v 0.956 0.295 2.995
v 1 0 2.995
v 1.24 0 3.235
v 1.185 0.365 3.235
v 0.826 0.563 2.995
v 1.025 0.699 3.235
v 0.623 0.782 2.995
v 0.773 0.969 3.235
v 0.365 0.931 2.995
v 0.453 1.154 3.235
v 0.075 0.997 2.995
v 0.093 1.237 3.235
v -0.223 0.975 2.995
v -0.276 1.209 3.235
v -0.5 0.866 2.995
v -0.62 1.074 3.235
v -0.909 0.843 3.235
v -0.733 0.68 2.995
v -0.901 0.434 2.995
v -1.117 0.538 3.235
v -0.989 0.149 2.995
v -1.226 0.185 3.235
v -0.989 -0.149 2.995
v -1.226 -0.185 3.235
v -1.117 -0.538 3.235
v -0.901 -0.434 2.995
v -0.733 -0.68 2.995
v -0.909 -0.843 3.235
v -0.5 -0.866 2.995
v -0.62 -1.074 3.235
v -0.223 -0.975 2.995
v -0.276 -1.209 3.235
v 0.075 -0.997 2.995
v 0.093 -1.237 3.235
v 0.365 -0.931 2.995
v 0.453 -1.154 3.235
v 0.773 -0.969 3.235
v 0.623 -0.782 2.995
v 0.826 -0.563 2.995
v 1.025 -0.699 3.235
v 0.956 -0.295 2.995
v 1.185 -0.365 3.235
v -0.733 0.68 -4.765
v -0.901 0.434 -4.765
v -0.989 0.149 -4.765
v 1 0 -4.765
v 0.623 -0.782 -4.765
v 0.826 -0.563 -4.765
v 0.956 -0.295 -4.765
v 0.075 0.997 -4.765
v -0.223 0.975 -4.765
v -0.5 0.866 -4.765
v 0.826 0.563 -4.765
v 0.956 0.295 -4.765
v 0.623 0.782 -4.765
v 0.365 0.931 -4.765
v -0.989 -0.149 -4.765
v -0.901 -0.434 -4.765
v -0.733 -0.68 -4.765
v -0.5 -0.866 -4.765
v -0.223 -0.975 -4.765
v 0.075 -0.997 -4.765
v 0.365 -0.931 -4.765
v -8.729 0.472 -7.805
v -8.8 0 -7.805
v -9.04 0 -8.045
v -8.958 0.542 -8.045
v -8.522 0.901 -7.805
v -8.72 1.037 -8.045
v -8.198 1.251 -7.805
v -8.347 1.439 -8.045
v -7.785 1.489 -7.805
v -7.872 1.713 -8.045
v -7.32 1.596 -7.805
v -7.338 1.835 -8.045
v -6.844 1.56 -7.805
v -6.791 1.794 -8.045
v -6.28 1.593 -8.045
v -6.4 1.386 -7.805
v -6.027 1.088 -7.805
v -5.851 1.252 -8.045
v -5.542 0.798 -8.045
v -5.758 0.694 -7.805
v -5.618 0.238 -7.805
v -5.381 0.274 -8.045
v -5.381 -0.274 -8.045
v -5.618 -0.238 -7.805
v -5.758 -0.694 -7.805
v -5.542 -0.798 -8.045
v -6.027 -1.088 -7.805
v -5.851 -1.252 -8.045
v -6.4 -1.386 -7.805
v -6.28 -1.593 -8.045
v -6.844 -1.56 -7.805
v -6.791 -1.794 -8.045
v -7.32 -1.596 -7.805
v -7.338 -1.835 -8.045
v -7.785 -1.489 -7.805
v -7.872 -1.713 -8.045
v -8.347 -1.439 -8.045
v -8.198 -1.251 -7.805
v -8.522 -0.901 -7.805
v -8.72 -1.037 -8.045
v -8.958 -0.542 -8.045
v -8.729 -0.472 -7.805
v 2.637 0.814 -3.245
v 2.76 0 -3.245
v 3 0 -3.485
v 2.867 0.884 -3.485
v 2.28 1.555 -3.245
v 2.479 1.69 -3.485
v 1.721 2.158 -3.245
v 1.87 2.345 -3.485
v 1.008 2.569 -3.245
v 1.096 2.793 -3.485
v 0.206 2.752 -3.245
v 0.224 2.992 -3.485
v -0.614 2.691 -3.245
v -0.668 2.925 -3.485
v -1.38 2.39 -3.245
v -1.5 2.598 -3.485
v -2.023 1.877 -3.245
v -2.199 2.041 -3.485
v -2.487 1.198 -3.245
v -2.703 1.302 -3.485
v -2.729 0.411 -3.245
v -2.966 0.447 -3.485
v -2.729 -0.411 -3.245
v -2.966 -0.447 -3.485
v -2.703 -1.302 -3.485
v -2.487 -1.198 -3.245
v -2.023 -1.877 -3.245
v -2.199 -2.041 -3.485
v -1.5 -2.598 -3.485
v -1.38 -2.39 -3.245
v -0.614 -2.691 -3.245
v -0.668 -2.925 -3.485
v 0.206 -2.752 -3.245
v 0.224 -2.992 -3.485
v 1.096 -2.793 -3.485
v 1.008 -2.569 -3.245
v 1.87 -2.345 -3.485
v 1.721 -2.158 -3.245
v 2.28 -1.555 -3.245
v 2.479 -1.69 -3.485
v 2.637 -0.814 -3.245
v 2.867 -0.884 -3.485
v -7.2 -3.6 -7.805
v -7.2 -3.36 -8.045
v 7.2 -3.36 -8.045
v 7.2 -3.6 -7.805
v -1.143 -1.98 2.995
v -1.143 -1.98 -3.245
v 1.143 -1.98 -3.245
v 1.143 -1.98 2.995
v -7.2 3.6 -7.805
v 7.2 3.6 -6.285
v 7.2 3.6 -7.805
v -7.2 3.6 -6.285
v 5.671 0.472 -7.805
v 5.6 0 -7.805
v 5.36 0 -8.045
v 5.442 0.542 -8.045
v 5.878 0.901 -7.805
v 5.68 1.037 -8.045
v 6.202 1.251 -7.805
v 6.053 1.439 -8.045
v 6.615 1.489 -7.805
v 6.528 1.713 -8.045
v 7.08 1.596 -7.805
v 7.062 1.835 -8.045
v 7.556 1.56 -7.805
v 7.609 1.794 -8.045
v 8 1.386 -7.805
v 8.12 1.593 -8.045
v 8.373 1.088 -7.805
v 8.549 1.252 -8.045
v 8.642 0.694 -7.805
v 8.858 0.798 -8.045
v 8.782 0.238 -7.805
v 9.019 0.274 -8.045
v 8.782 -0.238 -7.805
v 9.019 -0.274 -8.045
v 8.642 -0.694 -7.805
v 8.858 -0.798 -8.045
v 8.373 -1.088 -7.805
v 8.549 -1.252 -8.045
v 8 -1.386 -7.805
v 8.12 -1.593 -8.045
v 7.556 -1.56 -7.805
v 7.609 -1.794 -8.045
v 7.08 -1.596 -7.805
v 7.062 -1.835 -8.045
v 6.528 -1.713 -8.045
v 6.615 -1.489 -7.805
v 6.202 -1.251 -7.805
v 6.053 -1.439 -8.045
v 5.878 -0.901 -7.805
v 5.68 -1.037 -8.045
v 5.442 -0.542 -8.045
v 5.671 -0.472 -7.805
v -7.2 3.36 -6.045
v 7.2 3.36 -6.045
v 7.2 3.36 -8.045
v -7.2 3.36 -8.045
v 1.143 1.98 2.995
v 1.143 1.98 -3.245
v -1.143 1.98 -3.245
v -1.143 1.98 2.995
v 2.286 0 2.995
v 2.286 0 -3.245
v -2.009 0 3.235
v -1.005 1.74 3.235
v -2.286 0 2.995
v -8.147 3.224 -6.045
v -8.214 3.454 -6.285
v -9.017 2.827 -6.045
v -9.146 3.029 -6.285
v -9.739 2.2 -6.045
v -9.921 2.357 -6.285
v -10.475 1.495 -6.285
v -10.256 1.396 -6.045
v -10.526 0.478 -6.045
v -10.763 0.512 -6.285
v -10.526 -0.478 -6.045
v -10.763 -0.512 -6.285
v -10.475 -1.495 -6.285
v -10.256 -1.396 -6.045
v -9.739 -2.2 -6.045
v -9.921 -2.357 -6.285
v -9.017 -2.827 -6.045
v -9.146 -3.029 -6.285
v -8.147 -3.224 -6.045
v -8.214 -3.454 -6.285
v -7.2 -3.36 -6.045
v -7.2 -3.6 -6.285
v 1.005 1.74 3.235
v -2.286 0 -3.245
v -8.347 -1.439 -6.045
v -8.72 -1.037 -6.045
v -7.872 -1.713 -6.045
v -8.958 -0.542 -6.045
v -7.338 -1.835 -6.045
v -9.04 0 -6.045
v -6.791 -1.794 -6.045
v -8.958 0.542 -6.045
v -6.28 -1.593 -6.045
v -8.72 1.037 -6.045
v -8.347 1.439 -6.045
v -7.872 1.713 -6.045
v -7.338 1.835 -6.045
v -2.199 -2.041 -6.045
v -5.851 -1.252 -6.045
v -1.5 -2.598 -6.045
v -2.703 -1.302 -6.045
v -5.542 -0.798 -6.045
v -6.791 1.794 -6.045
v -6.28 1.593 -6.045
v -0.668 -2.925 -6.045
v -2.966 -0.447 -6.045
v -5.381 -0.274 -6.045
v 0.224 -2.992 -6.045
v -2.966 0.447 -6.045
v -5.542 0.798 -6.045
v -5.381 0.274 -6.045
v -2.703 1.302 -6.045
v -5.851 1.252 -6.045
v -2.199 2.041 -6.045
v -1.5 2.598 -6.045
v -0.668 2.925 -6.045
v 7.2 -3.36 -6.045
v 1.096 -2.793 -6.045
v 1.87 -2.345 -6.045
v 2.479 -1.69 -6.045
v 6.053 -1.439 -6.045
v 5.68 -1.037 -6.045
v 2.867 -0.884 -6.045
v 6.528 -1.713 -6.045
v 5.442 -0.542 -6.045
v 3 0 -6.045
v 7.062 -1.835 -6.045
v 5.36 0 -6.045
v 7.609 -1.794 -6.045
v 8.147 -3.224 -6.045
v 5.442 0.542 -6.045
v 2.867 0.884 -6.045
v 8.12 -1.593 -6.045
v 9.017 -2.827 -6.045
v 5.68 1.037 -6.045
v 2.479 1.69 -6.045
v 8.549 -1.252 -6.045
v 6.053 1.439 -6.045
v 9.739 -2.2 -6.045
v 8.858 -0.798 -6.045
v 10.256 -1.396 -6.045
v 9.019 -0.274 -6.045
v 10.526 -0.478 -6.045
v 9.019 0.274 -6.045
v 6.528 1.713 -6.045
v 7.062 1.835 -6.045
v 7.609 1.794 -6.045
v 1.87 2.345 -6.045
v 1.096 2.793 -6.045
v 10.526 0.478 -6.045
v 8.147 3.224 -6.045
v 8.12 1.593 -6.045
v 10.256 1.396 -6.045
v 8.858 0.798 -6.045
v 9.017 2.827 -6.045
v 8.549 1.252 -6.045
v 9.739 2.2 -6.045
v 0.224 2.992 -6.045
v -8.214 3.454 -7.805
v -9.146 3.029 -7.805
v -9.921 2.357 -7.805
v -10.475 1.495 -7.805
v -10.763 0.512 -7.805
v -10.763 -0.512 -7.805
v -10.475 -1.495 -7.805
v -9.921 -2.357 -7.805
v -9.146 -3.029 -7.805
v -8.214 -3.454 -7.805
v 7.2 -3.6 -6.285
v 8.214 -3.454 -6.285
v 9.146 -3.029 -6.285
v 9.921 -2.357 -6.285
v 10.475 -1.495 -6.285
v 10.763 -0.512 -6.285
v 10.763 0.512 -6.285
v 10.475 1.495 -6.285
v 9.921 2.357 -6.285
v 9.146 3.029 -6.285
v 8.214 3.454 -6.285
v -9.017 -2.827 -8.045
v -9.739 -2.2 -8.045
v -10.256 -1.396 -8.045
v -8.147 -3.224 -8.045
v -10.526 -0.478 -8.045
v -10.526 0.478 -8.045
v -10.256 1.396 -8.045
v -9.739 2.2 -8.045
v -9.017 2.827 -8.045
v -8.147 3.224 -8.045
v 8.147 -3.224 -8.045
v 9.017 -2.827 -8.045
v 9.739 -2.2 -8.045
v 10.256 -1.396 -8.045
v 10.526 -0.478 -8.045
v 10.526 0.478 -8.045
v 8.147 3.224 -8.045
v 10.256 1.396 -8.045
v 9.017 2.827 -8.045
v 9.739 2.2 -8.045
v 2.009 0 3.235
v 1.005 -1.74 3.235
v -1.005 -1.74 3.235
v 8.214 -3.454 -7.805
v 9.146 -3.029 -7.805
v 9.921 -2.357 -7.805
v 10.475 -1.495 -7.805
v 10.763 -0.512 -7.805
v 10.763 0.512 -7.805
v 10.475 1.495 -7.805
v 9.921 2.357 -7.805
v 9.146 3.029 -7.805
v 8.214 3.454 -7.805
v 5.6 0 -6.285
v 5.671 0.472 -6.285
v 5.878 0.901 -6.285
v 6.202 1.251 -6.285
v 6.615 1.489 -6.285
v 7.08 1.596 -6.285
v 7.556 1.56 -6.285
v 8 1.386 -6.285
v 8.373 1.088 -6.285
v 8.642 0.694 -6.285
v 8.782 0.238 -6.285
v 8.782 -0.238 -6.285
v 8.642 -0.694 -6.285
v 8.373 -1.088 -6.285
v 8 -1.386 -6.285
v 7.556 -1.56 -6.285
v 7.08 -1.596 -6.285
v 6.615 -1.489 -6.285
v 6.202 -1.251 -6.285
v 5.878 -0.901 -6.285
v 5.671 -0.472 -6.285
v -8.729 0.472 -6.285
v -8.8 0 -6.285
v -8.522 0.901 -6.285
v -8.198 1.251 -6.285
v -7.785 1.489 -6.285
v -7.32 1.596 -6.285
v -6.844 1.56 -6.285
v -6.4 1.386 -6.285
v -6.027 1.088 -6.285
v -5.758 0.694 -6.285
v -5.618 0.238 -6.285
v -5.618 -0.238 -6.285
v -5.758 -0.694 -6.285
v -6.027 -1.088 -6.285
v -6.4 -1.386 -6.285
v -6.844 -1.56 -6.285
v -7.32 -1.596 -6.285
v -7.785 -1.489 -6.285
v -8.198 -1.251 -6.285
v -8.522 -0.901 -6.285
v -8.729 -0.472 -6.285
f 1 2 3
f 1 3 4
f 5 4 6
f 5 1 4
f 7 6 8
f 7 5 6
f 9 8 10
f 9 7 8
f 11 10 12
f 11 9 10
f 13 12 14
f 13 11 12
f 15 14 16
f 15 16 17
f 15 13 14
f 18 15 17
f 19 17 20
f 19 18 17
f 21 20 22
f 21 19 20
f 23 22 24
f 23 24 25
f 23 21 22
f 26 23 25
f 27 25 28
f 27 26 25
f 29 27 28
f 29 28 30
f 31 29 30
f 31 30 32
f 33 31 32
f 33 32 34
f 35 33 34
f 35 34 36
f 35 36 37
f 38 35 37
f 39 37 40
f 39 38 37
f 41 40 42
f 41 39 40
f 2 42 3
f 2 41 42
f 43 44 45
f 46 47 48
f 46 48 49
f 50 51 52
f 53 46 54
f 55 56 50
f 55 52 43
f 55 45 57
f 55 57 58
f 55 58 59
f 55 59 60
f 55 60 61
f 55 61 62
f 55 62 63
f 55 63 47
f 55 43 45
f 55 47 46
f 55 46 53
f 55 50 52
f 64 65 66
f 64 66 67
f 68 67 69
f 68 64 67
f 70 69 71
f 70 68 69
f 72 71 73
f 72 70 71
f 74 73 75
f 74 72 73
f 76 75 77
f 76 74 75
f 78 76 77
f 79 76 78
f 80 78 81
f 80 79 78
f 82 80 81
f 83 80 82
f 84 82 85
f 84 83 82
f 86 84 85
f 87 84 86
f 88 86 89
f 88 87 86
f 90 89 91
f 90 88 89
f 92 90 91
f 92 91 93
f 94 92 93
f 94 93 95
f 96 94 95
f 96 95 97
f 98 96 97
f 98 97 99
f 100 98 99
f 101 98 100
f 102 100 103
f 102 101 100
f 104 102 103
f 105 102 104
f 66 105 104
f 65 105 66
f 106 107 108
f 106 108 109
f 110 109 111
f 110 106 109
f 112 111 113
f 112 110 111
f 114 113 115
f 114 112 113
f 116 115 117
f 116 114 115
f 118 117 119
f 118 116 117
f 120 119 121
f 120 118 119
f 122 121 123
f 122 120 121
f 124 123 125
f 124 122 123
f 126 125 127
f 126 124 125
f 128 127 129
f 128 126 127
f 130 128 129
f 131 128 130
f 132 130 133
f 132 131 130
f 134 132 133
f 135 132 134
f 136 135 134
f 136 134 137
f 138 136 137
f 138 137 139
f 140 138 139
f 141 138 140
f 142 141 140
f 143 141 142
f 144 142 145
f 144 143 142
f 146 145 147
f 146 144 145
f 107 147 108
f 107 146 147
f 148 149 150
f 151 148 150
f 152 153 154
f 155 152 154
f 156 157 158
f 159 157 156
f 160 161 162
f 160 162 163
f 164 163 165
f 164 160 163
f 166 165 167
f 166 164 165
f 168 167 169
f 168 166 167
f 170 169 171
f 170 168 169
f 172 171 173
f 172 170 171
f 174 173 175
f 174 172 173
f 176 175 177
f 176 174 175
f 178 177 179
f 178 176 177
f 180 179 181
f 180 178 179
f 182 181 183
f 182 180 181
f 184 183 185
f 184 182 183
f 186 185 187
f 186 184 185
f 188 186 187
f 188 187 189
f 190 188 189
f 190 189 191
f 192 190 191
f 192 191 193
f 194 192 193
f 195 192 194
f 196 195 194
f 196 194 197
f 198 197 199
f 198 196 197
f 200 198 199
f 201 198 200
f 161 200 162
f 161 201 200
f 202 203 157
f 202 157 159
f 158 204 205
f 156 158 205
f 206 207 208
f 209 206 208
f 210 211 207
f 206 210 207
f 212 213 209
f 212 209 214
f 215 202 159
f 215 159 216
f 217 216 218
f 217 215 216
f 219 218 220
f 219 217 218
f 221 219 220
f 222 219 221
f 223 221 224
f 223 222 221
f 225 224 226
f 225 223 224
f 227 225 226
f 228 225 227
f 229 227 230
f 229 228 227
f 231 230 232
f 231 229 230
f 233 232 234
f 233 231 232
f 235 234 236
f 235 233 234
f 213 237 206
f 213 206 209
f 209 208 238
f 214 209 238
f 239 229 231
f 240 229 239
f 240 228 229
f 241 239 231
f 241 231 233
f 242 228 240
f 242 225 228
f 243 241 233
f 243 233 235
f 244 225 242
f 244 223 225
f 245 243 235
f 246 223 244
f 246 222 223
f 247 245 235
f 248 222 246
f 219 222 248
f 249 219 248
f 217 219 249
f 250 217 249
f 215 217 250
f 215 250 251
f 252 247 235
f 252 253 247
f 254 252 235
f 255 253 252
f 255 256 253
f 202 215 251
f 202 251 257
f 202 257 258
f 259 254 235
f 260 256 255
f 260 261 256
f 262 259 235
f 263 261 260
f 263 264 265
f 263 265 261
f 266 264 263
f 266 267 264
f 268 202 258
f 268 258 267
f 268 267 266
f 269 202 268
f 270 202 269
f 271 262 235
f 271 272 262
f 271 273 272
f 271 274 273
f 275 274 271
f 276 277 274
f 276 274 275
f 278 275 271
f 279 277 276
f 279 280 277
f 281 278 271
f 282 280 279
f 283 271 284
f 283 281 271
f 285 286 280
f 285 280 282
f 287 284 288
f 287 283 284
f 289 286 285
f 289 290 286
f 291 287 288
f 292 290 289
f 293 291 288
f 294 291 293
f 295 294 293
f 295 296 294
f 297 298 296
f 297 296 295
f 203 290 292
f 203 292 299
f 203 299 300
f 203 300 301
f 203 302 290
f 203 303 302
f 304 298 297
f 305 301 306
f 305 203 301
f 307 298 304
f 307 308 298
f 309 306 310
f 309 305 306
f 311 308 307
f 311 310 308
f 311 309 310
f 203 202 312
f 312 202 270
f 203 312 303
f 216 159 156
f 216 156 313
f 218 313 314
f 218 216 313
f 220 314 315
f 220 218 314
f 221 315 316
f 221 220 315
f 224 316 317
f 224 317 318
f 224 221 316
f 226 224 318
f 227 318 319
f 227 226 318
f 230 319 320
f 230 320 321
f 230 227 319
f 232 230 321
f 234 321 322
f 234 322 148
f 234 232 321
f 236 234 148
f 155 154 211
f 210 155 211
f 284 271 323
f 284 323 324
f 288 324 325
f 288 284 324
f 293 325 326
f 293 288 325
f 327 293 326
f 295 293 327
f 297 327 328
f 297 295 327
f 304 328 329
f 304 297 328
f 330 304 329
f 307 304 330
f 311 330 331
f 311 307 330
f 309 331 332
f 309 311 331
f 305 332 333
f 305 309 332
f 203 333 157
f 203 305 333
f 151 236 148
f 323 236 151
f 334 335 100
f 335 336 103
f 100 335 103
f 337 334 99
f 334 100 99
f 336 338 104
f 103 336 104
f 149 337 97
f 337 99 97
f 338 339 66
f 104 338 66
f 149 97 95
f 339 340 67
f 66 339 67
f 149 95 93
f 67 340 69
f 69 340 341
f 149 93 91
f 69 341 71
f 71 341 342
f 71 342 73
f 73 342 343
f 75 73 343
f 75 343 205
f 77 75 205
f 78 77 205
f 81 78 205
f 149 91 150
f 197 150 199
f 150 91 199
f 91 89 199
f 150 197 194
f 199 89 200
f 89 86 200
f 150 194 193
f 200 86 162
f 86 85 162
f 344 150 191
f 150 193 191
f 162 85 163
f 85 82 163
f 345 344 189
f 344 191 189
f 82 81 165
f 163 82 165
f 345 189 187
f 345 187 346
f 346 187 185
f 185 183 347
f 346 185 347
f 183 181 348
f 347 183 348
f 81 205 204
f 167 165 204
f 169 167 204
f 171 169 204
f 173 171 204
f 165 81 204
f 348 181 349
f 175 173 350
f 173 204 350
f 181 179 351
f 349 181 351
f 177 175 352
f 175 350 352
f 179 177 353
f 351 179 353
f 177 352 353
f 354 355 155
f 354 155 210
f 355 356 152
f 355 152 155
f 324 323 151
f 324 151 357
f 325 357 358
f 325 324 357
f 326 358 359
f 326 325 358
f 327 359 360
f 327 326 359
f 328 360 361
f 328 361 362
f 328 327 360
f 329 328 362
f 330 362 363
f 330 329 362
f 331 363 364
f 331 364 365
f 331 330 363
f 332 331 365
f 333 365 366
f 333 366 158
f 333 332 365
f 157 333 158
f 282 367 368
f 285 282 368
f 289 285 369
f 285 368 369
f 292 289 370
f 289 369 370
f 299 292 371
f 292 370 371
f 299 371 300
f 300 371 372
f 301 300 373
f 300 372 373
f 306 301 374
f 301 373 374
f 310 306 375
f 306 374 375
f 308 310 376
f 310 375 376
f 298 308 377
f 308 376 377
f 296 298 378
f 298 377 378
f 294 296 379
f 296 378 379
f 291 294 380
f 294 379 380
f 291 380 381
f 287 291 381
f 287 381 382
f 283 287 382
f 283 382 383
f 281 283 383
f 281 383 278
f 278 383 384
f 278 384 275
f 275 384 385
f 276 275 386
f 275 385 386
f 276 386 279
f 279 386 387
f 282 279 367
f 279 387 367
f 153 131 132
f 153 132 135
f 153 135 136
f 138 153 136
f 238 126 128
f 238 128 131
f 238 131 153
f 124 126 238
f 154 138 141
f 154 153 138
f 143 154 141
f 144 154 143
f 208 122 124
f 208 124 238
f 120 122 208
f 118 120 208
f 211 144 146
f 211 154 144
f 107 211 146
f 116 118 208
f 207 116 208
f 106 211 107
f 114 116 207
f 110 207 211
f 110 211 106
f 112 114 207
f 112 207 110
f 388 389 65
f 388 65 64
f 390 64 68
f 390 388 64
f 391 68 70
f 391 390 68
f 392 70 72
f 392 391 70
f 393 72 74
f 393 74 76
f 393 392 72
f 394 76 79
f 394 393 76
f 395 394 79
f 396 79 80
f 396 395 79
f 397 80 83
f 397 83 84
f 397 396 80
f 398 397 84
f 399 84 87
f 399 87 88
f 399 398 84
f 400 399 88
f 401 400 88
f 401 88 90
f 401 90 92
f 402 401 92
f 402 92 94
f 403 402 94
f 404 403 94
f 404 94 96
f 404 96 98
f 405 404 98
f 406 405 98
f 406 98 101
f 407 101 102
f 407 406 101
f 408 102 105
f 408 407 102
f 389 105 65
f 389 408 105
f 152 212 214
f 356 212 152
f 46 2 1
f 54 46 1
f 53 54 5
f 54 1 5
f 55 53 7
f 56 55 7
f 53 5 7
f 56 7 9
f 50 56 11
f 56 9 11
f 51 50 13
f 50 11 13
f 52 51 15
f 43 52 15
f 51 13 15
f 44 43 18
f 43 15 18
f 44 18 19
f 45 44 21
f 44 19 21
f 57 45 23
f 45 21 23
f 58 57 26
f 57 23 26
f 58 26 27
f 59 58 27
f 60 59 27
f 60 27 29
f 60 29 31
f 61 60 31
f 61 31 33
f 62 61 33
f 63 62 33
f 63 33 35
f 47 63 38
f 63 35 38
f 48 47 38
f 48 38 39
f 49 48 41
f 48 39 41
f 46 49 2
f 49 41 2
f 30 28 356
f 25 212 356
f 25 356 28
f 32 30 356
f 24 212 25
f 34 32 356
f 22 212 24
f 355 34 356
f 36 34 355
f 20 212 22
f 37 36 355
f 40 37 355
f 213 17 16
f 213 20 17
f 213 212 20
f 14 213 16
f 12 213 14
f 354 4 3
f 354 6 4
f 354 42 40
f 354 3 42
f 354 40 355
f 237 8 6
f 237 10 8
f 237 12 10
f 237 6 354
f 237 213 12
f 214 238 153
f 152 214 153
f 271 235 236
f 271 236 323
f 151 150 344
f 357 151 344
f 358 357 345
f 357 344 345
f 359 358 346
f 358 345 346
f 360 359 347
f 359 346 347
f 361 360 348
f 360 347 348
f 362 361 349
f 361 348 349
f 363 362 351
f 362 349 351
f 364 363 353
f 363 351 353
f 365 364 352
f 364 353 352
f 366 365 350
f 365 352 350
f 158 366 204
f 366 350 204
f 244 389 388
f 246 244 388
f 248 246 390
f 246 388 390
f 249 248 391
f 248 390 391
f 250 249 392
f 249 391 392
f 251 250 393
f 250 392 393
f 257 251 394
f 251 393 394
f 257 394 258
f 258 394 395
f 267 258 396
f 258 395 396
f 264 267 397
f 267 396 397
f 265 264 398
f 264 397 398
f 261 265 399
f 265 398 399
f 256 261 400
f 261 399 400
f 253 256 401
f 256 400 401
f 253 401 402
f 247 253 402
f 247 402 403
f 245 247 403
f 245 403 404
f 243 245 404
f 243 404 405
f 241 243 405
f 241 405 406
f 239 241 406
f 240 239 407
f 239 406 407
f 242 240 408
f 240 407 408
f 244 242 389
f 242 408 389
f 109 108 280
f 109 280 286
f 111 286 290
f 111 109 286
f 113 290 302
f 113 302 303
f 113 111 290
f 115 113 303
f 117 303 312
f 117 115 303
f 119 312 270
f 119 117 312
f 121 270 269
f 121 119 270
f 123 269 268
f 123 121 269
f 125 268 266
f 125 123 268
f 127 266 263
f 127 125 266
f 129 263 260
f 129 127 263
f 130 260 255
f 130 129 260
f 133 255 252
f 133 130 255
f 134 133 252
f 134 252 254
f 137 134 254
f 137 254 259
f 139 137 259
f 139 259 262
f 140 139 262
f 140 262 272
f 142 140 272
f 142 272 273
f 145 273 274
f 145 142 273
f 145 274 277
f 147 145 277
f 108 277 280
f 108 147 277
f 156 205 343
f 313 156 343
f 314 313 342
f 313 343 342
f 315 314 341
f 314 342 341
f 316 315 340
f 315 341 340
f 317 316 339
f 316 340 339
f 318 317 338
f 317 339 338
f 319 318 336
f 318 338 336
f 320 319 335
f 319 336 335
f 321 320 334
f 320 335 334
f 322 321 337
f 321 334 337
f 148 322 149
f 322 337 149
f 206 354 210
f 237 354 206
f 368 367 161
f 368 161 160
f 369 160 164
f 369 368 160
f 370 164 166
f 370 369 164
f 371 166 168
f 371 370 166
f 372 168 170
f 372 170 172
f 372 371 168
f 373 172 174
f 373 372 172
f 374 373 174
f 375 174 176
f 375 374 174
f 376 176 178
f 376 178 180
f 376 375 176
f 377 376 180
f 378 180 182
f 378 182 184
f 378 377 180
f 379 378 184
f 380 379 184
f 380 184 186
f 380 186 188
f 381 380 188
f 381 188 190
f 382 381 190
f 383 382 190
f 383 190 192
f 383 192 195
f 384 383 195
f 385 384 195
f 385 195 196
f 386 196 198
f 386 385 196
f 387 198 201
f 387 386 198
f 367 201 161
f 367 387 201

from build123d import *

# Parameters (mm, degrees)
BOSS_EXTRUDE1_DEPTH = 16.2
SKETCH2_R           = 7.5
BOSS_EXTRUDE2_DEPTH = 7
SKETCH3_R           = 4
BOSS_EXTRUDE3_DEPTH = 5
SKETCH4_R           = 2.5
CUT_EXTRUDE1_DEPTH  = 20
CHAMFER1_SIZE       = 0.6
SCALE1_SCALE        = 0.4


with BuildPart() as part:
    # Sketch1 → Boss-Extrude1 (new body)
    with BuildSketch(Plane.XY):
        Polygon((2.857883832, -4.95), (5.715767665, 0), (2.857883832, 4.95), (-2.857883832, 4.95), (-5.715767665, 0), (-2.857883832, -4.95), align=None)
    extrude(amount=BOSS_EXTRUDE1_DEPTH)

    # Sketch2 → Boss-Extrude2 (add)
    with BuildSketch(Plane.XY):
        Circle(SKETCH2_R)
    extrude(amount=-BOSS_EXTRUDE2_DEPTH)

    # Sketch3 → Boss-Extrude3 (add)
    with BuildSketch(Plane(origin=(0, 0, -7), x_dir=(-1, 0, 0), z_dir=(0, 0, -1))):
        with BuildLine():
            Line((-18, 9), (18, 9))
            ThreePointArc((18, 9), (27, 0), (18, -9))
            Line((18, -9), (-18, -9))
            ThreePointArc((-18, -9), (-27, 0), (-18, 9))
        make_face()
        with Locations((-18, 0)):
            Circle(SKETCH3_R, mode=Mode.SUBTRACT)
        with Locations((18, 0)):
            Circle(SKETCH3_R, mode=Mode.SUBTRACT)
    extrude(amount=BOSS_EXTRUDE3_DEPTH)

    # Sketch4 → Cut-Extrude1 (cut)
    with BuildSketch(Plane.XY.offset(16.2)):
        Circle(SKETCH4_R)
    extrude(amount=-CUT_EXTRUDE1_DEPTH, mode=Mode.SUBTRACT)

    # Chamfer1
    chamfer1_edges = [part.edges().sort_by_distance(p)[0] for p in [
        (4.286825749, 2.475, 16.2),
        (0, 4.95, 16.2),
        (-7.5, 0, 0),
        (-4.286825749, 2.475, 16.2),
        (-4.286825749, -2.475, 16.2),
        (27, 0, -12),
        (0, -9, -12),
        (-27, 0, -12),
        (0, 9, -12),
        (22, 0, -7),
        (-14, 0, -7),
        (27, 0, -7),
        (0, -9, -7),
        (-27, 0, -7),
        (0, 9, -7),
        (22, 0, -12),
        (-14, 0, -12),
        (-2.5, 0, 16.2),
        (0, -4.95, 16.2),
        (4.286825749, -2.475, 16.2),
    ]]
    chamfer(chamfer1_edges, length=CHAMFER1_SIZE)


with BuildPart() as part_1:
    # Scale1: scaled about (0, 0, -5.408282587)
    add(part.part.scale(SCALE1_SCALE).moved(Location((0, 0, -3.244969552))))


solid = part_1.part
